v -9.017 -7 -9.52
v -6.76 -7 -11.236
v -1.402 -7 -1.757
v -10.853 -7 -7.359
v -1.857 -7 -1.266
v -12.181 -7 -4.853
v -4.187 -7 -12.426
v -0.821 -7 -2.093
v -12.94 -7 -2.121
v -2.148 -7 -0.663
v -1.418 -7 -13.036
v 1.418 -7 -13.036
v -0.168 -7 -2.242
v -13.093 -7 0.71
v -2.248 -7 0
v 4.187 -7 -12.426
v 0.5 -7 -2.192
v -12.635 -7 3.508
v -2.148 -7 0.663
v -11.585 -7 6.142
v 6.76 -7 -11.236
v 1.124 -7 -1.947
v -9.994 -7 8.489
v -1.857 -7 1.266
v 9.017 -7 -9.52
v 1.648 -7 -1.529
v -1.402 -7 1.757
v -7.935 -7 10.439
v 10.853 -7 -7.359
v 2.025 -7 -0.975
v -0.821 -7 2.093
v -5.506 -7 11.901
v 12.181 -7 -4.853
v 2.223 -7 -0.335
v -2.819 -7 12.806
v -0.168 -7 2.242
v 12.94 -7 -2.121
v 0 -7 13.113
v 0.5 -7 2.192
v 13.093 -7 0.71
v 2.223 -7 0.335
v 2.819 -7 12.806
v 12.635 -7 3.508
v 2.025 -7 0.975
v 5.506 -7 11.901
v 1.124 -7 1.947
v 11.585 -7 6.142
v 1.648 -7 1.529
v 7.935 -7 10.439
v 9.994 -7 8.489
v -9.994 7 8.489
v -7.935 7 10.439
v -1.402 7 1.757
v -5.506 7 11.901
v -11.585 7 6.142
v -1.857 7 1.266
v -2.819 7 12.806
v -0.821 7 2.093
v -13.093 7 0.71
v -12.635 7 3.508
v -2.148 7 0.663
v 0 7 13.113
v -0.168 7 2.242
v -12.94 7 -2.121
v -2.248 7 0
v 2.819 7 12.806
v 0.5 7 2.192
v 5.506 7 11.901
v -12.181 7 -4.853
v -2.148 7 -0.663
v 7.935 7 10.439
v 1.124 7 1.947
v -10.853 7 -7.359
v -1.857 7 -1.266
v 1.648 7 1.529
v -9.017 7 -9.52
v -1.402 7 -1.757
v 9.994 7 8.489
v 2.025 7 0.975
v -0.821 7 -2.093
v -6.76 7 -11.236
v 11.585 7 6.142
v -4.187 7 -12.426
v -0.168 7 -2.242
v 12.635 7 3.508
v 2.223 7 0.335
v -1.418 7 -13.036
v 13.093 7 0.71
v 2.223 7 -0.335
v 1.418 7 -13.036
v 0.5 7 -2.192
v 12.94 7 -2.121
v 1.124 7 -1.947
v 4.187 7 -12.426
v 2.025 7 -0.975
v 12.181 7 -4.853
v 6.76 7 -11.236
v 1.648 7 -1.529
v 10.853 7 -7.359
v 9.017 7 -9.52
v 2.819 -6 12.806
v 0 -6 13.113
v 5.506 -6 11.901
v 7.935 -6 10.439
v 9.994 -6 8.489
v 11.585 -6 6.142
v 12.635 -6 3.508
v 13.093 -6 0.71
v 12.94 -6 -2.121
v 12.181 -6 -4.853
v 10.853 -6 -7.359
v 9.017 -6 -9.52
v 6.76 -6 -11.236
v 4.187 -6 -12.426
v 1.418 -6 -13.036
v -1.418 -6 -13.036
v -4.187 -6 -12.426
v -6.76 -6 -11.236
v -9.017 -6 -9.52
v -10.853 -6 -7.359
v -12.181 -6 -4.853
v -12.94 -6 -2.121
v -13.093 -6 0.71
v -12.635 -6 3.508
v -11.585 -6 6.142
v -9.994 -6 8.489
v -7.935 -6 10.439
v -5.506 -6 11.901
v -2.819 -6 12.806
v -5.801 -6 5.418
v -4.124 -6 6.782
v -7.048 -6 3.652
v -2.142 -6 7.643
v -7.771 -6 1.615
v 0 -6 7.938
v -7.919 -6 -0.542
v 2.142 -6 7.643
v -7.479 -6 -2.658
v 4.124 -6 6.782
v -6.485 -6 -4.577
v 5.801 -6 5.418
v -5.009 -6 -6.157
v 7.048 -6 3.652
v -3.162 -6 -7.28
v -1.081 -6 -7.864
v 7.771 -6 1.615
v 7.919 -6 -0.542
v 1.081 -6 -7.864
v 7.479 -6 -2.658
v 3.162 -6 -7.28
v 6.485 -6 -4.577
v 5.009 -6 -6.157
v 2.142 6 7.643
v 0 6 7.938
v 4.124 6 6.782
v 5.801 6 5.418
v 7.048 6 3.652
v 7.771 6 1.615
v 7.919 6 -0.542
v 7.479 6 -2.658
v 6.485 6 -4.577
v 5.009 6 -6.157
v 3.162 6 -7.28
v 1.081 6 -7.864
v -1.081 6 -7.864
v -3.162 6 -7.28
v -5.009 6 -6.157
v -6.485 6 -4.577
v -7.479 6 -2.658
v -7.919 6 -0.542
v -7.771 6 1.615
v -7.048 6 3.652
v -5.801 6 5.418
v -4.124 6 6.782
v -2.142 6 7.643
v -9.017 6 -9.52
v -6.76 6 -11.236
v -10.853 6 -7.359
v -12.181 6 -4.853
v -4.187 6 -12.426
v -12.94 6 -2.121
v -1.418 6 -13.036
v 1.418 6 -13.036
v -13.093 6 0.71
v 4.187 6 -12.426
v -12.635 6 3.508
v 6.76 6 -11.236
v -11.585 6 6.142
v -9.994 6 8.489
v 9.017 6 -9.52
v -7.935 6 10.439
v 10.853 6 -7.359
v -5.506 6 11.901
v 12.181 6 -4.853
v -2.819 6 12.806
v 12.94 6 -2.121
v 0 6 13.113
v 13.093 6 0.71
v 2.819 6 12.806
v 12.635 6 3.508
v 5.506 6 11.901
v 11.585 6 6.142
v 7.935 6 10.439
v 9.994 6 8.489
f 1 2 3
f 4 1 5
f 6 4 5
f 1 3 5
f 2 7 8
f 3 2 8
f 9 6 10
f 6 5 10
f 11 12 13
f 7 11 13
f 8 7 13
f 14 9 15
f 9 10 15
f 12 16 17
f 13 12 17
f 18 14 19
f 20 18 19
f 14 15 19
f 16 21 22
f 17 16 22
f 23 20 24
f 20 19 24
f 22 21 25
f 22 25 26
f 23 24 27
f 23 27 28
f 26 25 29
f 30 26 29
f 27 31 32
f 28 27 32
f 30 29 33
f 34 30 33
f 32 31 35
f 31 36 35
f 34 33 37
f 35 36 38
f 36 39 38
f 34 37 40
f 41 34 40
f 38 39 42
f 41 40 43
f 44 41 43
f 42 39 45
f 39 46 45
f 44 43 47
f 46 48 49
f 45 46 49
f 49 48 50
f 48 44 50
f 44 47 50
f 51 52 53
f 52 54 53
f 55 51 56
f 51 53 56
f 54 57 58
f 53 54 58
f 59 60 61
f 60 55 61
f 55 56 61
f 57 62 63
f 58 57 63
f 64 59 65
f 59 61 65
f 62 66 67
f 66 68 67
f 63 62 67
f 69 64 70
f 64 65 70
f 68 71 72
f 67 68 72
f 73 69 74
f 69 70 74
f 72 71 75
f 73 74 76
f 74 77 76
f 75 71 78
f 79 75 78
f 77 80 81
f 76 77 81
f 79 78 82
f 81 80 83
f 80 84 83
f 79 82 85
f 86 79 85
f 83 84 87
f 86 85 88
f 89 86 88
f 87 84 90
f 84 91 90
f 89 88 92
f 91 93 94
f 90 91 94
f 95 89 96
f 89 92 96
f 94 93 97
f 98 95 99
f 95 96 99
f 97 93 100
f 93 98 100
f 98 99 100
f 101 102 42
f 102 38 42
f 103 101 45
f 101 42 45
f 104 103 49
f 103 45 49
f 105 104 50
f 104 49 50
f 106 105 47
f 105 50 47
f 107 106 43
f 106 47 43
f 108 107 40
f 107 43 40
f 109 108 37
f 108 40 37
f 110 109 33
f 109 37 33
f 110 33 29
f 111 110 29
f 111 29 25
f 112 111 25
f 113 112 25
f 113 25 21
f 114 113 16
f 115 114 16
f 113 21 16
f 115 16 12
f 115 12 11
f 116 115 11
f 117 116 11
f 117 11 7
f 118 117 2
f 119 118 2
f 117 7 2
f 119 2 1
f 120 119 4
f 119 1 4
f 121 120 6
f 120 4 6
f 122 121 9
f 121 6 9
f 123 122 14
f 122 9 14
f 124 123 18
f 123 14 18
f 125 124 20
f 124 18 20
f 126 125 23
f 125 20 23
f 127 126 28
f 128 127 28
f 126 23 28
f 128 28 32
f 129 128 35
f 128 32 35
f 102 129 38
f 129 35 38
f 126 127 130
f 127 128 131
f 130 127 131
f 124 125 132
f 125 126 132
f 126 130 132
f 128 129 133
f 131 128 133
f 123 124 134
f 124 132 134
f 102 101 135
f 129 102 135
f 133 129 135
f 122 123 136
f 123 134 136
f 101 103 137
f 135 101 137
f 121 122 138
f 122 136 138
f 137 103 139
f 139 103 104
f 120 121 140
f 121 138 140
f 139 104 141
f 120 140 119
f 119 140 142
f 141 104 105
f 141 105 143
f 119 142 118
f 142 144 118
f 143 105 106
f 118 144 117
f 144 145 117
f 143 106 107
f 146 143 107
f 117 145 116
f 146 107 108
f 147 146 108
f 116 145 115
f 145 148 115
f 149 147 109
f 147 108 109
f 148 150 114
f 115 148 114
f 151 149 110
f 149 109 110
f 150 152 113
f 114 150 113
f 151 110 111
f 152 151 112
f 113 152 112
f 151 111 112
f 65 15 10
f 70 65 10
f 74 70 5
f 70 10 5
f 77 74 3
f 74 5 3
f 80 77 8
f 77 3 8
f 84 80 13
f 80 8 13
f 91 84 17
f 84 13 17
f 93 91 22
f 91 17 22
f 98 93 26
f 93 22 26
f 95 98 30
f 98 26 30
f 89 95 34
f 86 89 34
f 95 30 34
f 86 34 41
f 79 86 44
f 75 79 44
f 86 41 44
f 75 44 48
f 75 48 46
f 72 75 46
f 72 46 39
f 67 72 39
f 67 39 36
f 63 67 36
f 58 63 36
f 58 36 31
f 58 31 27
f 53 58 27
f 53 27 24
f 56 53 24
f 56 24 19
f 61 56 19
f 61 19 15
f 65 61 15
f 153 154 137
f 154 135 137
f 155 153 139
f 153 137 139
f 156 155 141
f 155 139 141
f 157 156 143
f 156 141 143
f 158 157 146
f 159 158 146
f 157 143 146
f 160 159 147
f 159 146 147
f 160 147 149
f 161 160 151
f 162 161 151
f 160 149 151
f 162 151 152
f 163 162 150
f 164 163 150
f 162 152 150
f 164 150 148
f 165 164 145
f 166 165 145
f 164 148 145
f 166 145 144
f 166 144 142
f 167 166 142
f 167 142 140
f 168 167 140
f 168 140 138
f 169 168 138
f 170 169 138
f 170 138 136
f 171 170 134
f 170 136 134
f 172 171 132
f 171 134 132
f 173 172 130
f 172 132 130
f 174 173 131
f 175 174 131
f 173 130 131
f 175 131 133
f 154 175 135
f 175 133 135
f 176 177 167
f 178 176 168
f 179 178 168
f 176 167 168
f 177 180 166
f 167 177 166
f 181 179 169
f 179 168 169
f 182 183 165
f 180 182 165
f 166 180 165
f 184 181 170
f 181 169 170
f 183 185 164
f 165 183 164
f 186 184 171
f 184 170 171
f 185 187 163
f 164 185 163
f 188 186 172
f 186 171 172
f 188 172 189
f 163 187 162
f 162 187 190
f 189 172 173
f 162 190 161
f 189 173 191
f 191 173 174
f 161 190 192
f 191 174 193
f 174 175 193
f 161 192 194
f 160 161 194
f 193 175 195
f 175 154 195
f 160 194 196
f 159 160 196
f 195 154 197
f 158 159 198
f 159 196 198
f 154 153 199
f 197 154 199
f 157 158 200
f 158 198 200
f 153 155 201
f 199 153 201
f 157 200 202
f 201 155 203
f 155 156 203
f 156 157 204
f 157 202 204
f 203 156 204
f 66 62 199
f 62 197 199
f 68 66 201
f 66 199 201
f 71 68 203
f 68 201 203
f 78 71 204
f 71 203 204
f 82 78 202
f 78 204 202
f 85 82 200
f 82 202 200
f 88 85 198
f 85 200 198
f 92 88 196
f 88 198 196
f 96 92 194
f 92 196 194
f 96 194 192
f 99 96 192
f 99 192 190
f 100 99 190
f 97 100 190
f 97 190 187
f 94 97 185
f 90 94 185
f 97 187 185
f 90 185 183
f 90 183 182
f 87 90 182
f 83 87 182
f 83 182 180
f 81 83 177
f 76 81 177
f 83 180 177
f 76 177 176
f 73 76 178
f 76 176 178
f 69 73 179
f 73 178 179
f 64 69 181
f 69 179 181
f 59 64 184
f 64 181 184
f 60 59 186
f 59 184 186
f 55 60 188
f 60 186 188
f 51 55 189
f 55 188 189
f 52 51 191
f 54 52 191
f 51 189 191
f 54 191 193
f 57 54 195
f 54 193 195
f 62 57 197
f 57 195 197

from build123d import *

# Parameters (mm, degrees)
F_8_CLEARANCE_HOLE1_D = 4.4958


with BuildPart() as part:
    # Sketch1 → Revolve1 (revolve)
    with BuildSketch(Plane(origin=(0, 0, 0), x_dir=(0, 0, -1), z_dir=(1, 0, 0))):
        Polygon((0, -7), (0, 7), (-13.112500064, 7), (-13.112500064, 6), (-7.9375, 6), (-7.9375, -6), (-13.112500064, -6), (-13.112500064, -7), align=None)
    revolve(axis=Axis((0, -7, 0), (0, 1, 0)))

    # #8 Clearance Hole1 (through all)
    with Locations(Plane(origin=(0, 7, 0), x_dir=(1, 0, 0), z_dir=(0, 1, 0))):
        with Locations((0, 0)):
            Hole(F_8_CLEARANCE_HOLE1_D / 2)


solid = part.part
